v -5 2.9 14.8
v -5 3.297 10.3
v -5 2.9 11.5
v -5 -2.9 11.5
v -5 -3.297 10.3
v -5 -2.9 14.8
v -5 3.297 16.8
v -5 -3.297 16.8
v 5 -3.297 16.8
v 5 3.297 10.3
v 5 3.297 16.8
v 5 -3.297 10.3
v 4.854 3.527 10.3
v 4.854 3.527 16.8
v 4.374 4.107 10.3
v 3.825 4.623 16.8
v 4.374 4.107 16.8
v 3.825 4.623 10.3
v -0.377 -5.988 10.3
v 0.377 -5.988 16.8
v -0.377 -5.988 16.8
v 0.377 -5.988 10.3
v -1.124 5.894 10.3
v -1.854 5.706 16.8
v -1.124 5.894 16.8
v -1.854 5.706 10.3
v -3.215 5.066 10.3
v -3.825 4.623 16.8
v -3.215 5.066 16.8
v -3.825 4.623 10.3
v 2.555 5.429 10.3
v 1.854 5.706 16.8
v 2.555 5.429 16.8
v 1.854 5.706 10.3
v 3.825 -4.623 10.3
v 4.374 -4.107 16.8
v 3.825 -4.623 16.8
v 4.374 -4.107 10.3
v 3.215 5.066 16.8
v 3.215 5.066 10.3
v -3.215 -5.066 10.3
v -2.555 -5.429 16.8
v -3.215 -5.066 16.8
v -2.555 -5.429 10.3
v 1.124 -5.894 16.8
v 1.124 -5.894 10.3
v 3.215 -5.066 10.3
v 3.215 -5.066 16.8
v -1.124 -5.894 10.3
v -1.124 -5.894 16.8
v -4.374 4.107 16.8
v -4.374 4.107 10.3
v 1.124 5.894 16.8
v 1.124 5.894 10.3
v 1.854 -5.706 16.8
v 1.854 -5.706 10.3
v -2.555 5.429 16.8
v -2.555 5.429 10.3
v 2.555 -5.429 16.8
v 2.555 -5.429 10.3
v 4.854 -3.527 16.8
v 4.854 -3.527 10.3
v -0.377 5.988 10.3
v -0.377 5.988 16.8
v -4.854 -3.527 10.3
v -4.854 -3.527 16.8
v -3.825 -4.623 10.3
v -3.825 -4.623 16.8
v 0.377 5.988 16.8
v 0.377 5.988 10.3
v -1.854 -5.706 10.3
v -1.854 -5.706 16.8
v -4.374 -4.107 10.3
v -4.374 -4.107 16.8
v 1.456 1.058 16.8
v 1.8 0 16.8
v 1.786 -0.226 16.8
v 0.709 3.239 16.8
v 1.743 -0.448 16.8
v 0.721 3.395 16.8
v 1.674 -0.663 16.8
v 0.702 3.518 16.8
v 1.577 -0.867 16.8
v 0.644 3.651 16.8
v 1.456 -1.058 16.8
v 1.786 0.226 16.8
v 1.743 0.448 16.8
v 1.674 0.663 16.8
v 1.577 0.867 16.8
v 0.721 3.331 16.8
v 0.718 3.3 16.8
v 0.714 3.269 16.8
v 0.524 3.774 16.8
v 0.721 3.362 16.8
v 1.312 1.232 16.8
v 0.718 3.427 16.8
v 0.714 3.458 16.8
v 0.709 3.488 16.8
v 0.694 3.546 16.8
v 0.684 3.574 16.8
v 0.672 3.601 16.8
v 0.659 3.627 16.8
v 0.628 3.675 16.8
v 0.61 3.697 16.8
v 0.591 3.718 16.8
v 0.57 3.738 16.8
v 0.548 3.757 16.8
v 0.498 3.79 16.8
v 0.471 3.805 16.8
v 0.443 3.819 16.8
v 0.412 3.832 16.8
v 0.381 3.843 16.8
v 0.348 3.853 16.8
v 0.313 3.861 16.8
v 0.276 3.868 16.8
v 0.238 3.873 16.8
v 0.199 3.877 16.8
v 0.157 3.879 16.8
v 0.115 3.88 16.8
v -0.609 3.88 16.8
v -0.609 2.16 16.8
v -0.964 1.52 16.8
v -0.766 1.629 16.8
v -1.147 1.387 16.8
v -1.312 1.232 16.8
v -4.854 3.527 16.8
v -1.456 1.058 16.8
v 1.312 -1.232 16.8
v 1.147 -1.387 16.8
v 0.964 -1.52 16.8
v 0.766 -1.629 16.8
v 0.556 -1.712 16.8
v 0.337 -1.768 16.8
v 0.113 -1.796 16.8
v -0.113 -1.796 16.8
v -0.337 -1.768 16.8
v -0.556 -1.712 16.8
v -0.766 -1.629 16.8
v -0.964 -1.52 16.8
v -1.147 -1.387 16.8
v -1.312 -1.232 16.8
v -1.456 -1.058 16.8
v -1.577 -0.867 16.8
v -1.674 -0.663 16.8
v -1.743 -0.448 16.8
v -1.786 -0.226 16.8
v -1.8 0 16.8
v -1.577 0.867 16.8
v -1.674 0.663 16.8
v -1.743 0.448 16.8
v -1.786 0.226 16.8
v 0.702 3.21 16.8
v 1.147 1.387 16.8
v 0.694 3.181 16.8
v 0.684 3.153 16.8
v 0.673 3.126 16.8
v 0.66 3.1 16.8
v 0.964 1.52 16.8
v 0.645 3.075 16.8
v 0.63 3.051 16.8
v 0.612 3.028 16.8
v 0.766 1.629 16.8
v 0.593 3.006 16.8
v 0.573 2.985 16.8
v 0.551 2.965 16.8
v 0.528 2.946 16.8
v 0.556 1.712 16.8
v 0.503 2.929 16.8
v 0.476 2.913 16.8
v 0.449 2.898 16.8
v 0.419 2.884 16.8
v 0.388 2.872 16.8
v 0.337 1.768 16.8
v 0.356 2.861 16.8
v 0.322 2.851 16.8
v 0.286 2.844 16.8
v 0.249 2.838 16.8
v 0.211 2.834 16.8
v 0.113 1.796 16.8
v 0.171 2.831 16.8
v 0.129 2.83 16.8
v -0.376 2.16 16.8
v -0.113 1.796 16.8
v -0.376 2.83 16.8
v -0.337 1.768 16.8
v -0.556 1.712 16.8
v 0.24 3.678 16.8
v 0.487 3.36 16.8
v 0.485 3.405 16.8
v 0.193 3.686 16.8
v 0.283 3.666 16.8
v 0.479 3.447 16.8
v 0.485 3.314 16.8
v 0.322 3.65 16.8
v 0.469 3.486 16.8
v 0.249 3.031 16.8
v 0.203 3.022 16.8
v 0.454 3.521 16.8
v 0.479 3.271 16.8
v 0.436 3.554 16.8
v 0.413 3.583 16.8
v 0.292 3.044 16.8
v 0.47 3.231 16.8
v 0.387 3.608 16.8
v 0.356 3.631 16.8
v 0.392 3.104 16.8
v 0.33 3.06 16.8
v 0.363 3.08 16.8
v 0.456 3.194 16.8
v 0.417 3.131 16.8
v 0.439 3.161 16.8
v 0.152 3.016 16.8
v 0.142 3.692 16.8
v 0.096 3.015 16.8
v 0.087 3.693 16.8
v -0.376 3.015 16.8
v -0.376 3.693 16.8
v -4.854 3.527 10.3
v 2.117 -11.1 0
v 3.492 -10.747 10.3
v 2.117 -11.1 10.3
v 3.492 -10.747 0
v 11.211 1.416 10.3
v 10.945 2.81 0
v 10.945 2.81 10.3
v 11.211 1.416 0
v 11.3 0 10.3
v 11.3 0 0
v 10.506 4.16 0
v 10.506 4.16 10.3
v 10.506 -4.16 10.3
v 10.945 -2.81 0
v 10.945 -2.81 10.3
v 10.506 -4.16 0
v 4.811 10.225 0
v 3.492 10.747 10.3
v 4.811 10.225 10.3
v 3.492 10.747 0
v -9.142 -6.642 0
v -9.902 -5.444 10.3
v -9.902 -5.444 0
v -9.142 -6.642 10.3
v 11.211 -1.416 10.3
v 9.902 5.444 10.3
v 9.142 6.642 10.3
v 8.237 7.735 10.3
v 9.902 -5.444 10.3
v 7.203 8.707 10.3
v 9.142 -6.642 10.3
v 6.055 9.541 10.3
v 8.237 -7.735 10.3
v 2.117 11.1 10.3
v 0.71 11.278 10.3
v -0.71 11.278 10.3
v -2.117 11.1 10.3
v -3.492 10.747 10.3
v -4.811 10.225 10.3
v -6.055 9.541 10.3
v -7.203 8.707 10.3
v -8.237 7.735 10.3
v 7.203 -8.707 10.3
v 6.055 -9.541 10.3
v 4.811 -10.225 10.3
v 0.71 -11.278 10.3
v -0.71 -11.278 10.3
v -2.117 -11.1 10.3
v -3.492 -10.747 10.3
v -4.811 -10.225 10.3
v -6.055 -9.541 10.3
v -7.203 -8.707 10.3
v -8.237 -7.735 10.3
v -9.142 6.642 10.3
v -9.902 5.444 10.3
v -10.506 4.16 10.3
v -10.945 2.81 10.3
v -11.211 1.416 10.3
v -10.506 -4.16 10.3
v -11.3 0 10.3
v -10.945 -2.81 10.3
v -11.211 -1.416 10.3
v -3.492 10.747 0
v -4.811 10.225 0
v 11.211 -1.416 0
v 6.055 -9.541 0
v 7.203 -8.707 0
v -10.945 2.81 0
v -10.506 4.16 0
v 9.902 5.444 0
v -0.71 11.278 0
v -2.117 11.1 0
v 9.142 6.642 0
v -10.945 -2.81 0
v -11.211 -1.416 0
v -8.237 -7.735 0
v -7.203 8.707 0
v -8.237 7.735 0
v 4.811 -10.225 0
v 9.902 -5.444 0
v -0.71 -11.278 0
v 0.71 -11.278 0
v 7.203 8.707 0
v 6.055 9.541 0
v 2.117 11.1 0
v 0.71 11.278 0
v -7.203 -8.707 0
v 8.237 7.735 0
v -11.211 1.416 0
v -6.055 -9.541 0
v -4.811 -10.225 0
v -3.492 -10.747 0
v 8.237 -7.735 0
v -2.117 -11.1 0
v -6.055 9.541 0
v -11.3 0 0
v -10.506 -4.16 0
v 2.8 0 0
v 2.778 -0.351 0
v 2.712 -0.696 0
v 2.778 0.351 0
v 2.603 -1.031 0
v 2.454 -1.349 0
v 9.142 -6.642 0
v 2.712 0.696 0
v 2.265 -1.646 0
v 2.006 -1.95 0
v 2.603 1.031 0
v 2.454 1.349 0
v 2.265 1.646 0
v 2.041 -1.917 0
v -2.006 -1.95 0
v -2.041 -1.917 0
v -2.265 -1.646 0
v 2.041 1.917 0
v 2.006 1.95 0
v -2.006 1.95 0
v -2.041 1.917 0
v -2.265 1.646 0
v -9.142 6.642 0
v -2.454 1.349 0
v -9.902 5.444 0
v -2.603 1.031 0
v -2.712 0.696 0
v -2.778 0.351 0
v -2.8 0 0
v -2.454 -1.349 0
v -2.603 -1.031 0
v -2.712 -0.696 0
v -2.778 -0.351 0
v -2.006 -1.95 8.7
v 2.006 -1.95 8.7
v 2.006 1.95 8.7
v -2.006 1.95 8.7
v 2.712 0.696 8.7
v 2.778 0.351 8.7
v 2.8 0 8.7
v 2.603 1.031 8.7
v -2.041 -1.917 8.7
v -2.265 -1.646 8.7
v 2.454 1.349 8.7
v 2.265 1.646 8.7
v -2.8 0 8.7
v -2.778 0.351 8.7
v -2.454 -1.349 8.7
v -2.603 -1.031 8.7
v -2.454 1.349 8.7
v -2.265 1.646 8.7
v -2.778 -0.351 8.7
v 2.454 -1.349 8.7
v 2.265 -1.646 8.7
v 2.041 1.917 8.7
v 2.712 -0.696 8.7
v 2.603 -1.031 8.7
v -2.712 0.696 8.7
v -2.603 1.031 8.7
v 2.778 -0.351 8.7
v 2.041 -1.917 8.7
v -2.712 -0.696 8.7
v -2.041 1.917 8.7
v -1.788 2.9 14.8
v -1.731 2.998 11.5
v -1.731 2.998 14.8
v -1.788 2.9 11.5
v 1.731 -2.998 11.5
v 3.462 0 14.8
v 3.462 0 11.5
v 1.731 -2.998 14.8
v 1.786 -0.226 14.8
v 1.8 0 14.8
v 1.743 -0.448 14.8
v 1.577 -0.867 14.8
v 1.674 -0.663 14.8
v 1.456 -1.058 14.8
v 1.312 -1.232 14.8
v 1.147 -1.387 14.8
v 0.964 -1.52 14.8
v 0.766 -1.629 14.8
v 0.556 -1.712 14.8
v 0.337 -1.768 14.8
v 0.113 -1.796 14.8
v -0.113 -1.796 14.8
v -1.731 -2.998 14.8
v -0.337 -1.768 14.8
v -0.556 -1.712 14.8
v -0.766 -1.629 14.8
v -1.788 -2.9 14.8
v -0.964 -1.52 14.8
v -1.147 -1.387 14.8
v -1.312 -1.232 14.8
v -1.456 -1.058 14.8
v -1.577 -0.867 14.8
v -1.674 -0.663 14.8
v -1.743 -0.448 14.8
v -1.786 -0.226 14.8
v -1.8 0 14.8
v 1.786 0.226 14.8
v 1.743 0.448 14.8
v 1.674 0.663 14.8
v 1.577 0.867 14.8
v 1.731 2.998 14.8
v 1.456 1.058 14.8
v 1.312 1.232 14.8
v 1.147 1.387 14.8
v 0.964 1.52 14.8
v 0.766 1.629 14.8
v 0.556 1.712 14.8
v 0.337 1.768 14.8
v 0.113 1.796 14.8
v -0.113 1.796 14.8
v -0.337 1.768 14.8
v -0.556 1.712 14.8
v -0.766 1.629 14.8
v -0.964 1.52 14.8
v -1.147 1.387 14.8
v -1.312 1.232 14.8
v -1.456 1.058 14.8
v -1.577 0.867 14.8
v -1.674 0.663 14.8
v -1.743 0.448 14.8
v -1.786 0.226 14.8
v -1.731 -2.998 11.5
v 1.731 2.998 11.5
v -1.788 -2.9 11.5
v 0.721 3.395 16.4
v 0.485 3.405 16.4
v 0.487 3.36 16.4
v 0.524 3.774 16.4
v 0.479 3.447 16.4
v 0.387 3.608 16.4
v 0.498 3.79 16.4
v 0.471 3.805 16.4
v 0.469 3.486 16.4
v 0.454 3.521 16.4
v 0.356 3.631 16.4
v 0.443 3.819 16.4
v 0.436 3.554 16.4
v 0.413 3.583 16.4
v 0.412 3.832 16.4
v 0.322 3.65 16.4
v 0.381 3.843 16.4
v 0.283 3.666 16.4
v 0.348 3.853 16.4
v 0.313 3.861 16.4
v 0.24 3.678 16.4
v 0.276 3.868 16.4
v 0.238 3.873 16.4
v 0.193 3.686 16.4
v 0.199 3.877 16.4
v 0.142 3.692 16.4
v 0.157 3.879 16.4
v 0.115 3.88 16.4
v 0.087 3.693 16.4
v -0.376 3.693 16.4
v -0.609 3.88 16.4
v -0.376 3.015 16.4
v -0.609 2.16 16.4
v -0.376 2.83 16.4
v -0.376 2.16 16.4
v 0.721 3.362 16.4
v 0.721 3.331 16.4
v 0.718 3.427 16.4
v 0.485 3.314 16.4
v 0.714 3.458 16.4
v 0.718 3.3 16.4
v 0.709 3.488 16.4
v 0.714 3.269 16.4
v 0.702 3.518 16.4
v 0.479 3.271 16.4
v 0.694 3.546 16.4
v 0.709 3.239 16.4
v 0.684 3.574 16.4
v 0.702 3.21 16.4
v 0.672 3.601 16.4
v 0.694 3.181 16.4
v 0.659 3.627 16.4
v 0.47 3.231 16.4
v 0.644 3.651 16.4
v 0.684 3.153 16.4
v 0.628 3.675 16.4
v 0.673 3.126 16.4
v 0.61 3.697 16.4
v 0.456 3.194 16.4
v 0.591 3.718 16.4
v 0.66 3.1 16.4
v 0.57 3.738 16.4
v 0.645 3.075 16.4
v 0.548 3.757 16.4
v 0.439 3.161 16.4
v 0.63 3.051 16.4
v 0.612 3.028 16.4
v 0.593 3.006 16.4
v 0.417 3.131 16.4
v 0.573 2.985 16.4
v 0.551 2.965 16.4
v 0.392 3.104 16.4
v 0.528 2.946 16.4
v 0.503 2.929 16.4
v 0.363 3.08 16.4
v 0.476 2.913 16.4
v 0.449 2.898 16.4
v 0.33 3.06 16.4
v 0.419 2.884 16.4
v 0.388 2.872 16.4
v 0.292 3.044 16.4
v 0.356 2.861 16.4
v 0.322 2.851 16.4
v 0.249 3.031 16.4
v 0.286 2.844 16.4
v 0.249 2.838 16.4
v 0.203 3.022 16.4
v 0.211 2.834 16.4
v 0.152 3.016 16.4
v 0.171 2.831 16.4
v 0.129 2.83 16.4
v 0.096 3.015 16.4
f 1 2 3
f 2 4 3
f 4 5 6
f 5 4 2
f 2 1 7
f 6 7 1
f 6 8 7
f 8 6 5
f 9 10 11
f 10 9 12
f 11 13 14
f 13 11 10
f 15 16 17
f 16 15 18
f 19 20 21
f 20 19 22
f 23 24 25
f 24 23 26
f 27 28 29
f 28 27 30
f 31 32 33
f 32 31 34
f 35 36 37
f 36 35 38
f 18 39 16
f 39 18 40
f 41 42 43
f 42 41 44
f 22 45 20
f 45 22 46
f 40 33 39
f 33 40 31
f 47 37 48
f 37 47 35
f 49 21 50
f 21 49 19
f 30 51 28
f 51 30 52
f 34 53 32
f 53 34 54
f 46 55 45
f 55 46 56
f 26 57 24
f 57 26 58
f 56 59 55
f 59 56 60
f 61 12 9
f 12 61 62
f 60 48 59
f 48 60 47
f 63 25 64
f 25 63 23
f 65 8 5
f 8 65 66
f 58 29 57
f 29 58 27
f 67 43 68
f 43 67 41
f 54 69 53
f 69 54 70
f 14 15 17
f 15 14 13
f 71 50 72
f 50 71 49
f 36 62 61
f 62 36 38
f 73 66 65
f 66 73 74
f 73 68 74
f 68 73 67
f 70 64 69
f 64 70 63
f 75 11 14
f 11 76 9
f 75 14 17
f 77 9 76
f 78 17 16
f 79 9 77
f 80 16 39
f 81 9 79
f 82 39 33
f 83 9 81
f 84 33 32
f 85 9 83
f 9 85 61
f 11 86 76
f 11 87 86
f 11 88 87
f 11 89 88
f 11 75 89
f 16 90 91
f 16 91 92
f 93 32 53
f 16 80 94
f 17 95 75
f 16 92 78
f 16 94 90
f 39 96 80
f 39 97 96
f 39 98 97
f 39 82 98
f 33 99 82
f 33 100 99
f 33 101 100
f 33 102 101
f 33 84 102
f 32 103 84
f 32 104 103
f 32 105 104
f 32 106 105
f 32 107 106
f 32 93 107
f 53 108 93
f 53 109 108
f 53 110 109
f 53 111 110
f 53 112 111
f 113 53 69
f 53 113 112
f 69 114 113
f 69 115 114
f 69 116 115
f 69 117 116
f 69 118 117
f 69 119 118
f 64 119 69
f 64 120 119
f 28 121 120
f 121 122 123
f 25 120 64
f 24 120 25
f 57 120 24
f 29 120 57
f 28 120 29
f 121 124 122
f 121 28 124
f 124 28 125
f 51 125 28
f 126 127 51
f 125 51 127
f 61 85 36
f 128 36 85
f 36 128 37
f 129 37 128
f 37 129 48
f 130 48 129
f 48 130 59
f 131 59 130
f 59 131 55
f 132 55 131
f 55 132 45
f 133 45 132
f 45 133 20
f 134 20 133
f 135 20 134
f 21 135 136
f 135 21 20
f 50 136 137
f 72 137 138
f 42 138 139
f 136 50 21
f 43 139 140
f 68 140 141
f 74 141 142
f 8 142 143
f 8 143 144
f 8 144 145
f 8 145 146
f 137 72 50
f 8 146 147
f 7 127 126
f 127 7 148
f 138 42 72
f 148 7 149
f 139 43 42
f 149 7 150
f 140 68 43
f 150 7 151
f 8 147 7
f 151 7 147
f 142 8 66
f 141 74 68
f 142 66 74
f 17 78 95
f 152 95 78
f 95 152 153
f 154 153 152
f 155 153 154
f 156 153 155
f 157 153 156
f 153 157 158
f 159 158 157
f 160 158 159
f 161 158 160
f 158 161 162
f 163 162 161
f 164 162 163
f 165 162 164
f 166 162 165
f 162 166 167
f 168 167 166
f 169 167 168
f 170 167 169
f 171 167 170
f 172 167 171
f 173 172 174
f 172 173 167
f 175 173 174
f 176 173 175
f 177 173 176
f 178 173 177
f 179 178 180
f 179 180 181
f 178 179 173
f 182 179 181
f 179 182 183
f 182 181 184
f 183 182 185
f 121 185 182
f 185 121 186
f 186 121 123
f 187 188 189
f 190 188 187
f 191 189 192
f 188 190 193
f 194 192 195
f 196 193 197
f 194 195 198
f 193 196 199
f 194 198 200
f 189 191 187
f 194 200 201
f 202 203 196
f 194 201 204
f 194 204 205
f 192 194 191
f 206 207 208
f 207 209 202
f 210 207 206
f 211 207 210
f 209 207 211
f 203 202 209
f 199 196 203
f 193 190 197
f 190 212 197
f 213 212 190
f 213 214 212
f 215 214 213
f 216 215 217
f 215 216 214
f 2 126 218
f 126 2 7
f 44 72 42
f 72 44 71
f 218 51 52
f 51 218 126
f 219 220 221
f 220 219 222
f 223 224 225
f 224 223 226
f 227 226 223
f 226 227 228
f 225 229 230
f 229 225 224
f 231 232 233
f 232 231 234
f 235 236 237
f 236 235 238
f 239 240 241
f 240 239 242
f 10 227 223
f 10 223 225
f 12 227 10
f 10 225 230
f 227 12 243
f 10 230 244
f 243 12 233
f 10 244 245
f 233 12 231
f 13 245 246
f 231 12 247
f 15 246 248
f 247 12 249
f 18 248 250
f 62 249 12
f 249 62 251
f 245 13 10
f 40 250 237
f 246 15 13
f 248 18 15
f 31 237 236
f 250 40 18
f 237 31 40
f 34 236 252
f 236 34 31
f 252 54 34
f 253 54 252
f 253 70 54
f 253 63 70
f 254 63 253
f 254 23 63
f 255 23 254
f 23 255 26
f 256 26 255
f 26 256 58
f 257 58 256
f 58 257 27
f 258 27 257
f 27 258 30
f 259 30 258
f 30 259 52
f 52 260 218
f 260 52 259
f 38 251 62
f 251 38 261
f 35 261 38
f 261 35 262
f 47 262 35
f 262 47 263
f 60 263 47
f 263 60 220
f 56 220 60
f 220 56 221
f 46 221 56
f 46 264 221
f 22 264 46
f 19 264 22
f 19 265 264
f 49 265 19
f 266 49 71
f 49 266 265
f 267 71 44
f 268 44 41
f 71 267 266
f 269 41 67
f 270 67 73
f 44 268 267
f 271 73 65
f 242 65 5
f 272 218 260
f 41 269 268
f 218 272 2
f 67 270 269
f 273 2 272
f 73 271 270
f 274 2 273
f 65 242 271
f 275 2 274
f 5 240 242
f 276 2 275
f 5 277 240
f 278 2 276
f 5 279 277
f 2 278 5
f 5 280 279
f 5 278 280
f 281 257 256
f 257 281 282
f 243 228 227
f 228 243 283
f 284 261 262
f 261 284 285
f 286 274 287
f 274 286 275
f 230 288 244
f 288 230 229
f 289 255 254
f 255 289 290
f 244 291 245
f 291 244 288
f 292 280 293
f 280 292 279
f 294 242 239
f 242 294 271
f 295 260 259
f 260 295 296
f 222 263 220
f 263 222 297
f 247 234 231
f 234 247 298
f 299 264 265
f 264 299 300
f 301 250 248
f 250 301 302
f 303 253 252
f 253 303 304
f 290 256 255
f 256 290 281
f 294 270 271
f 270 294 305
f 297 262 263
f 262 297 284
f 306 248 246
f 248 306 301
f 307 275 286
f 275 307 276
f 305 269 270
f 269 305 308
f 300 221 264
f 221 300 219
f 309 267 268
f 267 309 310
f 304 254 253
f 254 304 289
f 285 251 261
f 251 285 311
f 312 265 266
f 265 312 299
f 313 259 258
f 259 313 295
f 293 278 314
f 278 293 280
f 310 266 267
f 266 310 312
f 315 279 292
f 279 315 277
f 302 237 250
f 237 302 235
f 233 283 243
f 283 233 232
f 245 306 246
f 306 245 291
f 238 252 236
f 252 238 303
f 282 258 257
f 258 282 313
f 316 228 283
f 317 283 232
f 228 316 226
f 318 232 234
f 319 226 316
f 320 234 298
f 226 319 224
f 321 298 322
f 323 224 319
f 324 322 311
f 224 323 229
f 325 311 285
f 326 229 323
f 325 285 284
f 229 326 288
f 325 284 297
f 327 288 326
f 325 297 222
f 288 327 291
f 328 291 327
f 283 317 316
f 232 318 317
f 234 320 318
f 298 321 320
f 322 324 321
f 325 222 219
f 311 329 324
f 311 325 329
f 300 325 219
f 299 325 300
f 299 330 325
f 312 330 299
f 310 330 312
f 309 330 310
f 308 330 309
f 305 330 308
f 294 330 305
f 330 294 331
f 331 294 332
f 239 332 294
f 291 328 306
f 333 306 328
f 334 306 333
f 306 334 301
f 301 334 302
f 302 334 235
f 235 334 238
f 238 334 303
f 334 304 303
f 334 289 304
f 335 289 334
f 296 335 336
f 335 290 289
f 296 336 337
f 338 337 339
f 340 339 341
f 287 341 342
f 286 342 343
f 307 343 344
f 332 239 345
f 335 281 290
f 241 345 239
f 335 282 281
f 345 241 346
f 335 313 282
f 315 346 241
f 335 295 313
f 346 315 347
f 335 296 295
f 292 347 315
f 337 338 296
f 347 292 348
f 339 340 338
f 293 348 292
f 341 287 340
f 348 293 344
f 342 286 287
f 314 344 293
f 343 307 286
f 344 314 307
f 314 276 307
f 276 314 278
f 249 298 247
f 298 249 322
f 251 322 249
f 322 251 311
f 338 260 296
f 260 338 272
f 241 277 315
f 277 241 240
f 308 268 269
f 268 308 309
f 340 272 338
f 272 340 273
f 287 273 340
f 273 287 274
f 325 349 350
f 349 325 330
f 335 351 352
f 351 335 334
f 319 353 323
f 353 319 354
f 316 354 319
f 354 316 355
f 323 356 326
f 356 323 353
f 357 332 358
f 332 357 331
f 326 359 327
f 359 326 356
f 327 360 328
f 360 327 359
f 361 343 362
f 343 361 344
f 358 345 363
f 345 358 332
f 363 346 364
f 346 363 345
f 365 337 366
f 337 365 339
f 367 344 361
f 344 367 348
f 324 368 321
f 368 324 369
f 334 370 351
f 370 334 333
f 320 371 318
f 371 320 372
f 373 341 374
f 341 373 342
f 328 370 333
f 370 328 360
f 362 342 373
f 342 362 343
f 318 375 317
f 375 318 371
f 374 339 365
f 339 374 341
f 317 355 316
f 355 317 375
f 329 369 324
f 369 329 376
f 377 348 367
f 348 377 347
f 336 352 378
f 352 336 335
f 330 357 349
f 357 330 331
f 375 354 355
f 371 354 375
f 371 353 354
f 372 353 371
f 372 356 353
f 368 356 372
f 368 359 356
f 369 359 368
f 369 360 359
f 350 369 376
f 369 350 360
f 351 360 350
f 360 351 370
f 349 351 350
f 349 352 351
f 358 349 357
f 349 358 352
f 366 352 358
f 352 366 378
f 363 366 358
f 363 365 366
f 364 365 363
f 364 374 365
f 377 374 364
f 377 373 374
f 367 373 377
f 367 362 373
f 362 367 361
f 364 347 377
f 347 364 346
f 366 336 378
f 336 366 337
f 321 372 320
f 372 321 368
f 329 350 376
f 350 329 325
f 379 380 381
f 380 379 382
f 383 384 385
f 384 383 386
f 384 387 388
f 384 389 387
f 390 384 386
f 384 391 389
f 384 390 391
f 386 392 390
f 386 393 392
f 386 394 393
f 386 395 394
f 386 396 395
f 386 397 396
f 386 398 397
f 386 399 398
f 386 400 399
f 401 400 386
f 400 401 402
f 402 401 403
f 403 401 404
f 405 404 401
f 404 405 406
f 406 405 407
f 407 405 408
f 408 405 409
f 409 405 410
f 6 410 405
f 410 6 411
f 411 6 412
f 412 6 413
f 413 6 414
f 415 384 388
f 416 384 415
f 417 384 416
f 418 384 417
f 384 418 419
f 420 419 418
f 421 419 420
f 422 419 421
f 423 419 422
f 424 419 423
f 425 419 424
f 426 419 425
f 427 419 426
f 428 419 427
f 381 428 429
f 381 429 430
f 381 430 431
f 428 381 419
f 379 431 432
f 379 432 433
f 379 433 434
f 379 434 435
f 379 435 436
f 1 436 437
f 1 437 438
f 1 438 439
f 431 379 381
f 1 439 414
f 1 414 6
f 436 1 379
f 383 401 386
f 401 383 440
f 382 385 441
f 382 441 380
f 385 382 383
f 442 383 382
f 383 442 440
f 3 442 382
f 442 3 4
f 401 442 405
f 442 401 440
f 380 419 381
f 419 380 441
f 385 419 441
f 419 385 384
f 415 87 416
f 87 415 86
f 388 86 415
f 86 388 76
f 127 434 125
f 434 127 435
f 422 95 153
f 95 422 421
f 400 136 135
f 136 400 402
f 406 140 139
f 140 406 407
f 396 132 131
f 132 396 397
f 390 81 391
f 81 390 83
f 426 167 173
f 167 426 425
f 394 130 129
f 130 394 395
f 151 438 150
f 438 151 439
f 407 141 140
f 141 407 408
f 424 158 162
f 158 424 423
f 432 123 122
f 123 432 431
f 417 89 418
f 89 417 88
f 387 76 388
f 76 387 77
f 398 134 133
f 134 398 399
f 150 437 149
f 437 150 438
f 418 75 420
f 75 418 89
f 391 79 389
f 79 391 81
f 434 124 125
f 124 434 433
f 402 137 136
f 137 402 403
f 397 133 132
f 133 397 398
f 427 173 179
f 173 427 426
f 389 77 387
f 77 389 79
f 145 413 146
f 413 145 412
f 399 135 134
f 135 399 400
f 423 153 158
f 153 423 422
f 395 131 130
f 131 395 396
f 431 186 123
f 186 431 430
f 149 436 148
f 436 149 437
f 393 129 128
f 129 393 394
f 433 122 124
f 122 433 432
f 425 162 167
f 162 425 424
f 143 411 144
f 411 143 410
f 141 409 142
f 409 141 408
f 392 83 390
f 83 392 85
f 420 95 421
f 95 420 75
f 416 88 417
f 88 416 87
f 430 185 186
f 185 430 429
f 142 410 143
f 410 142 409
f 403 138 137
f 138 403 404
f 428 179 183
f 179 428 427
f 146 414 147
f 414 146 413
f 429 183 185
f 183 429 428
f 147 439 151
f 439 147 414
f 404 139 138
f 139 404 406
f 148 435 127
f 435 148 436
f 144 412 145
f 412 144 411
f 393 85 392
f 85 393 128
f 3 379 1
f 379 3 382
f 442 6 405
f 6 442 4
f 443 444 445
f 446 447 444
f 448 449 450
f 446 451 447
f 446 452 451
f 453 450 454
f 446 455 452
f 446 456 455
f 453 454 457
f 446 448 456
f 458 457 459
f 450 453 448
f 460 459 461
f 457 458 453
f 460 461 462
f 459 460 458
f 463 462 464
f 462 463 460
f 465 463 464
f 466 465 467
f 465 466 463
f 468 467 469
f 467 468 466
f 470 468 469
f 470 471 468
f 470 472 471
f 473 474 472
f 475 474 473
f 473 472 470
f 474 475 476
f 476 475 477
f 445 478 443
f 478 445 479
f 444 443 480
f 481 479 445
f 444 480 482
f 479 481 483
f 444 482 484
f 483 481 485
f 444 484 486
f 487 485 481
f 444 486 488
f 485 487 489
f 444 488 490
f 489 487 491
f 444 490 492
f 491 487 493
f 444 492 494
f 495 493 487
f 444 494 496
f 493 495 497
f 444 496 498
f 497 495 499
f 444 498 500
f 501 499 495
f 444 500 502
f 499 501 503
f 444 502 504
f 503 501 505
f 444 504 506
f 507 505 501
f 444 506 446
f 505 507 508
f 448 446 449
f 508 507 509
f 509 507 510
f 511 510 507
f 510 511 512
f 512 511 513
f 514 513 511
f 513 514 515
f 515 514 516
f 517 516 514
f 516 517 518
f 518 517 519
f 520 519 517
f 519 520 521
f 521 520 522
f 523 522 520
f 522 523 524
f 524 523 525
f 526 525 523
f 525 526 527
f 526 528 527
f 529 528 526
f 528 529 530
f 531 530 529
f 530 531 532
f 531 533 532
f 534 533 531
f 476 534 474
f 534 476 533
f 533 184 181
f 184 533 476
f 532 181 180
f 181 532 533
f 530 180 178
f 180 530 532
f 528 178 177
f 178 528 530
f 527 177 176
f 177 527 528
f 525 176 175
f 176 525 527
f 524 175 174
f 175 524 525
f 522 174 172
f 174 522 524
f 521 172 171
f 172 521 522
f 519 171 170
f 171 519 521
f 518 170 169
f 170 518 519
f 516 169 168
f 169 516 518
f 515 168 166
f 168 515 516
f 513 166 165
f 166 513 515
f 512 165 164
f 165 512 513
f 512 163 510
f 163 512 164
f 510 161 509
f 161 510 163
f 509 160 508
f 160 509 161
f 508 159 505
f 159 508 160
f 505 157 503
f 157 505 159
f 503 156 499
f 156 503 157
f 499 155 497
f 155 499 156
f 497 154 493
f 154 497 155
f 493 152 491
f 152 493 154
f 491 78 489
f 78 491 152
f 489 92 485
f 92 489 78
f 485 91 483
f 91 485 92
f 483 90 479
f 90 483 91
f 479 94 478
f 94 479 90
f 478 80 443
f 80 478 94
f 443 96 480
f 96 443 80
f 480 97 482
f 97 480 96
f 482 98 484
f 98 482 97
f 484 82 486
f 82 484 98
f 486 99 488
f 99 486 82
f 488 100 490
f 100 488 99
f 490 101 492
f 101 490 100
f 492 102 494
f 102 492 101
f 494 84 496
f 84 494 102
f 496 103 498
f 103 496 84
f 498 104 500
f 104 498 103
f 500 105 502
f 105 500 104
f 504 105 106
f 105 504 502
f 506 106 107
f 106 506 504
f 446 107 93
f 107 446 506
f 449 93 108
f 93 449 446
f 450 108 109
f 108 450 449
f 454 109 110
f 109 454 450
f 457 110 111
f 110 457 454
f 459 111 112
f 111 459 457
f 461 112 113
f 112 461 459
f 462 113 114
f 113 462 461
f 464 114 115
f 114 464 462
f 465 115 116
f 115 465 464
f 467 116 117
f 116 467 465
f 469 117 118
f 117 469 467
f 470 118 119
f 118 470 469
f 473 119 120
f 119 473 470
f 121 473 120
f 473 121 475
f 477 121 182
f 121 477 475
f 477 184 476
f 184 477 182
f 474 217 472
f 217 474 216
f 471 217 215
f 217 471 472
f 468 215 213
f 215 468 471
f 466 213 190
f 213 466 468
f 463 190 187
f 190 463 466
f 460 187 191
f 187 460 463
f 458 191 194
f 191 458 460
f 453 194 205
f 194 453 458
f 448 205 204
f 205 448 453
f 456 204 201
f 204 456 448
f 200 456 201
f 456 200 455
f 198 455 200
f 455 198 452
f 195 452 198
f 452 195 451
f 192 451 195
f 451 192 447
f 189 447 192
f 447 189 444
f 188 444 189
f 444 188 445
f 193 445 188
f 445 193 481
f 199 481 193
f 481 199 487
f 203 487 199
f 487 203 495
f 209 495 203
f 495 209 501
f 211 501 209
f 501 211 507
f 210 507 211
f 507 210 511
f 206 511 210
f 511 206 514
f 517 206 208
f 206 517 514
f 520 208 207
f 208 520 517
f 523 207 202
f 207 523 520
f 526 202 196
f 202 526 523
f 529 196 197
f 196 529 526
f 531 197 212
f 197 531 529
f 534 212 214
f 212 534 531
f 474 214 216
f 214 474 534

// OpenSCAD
$fn = 50;

difference() {
	union() {
		translate(v = [0, 0, 0]) {
			rotate(a = [0, 0, 0]) {
				difference() {
					union() {
						translate(v = [0, 0, -3.5]) {
							rotate(a = [0, 0, 0]) {
								difference() {
									union() {
										translate(v = [0, 0, 0]) {
											rotate(a = [0, 0, 0]) {
												difference() {
													union() {
														translate(v = [0, 0, 13.79]) {
															cylinder(h = 6.51, r = 6.0);
														}
													}
													union() {
														translate(v = [-25.0, -20.0, 12.790000000000001]) {
															cube(size = [20, 40, 8.51]);
														}
														translate(v = [5.0, -20.0, 12.790000000000001]) {
															cube(size = [20, 40, 8.51]);
														}
													}
												}
											}
										}
										translate(v = [0, 0, 3.5]) {
											cylinder(h = 10.3, r = 11.3);
										}
									}
									union() {
										translate(v = [0, 0, 0]) {
											rotate(a = [0, 0, 0]) {
												difference() {
													union() {
														translate(v = [0, 0, 3.4]) {
															cylinder(h = 8.799999999999999, r = 2.8000000000000003);
														}
													}
													union() {
														translate(v = [-20.0, -21.95, 2.4]) {
															cube(size = [40, 20, 10.799999999999999]);
														}
														translate(v = [-20.0, 1.9499999999999993, 2.4]) {
															cube(size = [40, 20, 10.799999999999999]);
														}
													}
												}
											}
										}
										translate(v = [0, 0, 15]) {
											rotate(a = [0, 0, 0]) {
												difference() {
													union() {
														linear_extrude(height = 3.3) {
															polygon(points = [[3.4619999999999997, 0.0], [1.7310000000000003, 2.9981799479017264], [-1.7309999999999992, 2.9981799479017264], [-3.4619999999999997, 4.2397272186481365e-16], [-1.7310000000000014, -2.998179947901726], [1.7309999999999977, -2.9981799479017277]]);
														}
													}
													union();
												}
											}
										}
										translate(v = [0, 0, 15]) {
											cylinder(h = 6.300000000000001, r = 1.8);
										}
										translate(v = [-8.0, -2.9, 15]) {
											cube(size = [8, 5.8, 3.3]);
										}
										translate(v = [0, 3, 19.900000000000002]) {
											linear_extrude(height = 0.45) {
												text(font = "Liberation Sans", halign = "center", size = 1.8, text = "P", valign = "center");
											}
										}
									}
								}
							}
						}
					}
					union();
				}
			}
		}
	}
	union();
}
